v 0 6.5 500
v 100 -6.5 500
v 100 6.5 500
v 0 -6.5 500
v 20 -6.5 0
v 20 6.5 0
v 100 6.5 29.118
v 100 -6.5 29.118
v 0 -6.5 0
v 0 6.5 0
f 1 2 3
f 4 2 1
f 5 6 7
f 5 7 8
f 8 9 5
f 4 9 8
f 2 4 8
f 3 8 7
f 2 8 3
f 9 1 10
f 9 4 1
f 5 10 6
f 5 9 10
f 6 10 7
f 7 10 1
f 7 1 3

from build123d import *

# Parameters (mm, degrees)
PAD_DEPTH     = 6.5
CHAMFER_ANGLE = 20
CHAMFER_SIZE  = 80


with BuildPart() as part:
    # Sketch → Pad (new body, symmetric)
    with BuildSketch(Plane.XZ):
        Polygon((0, 0), (100, 0), (100, 500), (0, 500), (0, 1), align=None)
    extrude(amount=PAD_DEPTH, both=True)

    # Chamfer
    chamfer_edges = [part.edges().sort_by_distance(p)[0] for p in [
        (100, 0, 0),
    ]]
    chamfer_side = part.faces().sort_by_distance((50, 0, 0))[0]
    chamfer(chamfer_edges, length=CHAMFER_SIZE, angle=CHAMFER_ANGLE, reference=chamfer_side)


solid = part.part
